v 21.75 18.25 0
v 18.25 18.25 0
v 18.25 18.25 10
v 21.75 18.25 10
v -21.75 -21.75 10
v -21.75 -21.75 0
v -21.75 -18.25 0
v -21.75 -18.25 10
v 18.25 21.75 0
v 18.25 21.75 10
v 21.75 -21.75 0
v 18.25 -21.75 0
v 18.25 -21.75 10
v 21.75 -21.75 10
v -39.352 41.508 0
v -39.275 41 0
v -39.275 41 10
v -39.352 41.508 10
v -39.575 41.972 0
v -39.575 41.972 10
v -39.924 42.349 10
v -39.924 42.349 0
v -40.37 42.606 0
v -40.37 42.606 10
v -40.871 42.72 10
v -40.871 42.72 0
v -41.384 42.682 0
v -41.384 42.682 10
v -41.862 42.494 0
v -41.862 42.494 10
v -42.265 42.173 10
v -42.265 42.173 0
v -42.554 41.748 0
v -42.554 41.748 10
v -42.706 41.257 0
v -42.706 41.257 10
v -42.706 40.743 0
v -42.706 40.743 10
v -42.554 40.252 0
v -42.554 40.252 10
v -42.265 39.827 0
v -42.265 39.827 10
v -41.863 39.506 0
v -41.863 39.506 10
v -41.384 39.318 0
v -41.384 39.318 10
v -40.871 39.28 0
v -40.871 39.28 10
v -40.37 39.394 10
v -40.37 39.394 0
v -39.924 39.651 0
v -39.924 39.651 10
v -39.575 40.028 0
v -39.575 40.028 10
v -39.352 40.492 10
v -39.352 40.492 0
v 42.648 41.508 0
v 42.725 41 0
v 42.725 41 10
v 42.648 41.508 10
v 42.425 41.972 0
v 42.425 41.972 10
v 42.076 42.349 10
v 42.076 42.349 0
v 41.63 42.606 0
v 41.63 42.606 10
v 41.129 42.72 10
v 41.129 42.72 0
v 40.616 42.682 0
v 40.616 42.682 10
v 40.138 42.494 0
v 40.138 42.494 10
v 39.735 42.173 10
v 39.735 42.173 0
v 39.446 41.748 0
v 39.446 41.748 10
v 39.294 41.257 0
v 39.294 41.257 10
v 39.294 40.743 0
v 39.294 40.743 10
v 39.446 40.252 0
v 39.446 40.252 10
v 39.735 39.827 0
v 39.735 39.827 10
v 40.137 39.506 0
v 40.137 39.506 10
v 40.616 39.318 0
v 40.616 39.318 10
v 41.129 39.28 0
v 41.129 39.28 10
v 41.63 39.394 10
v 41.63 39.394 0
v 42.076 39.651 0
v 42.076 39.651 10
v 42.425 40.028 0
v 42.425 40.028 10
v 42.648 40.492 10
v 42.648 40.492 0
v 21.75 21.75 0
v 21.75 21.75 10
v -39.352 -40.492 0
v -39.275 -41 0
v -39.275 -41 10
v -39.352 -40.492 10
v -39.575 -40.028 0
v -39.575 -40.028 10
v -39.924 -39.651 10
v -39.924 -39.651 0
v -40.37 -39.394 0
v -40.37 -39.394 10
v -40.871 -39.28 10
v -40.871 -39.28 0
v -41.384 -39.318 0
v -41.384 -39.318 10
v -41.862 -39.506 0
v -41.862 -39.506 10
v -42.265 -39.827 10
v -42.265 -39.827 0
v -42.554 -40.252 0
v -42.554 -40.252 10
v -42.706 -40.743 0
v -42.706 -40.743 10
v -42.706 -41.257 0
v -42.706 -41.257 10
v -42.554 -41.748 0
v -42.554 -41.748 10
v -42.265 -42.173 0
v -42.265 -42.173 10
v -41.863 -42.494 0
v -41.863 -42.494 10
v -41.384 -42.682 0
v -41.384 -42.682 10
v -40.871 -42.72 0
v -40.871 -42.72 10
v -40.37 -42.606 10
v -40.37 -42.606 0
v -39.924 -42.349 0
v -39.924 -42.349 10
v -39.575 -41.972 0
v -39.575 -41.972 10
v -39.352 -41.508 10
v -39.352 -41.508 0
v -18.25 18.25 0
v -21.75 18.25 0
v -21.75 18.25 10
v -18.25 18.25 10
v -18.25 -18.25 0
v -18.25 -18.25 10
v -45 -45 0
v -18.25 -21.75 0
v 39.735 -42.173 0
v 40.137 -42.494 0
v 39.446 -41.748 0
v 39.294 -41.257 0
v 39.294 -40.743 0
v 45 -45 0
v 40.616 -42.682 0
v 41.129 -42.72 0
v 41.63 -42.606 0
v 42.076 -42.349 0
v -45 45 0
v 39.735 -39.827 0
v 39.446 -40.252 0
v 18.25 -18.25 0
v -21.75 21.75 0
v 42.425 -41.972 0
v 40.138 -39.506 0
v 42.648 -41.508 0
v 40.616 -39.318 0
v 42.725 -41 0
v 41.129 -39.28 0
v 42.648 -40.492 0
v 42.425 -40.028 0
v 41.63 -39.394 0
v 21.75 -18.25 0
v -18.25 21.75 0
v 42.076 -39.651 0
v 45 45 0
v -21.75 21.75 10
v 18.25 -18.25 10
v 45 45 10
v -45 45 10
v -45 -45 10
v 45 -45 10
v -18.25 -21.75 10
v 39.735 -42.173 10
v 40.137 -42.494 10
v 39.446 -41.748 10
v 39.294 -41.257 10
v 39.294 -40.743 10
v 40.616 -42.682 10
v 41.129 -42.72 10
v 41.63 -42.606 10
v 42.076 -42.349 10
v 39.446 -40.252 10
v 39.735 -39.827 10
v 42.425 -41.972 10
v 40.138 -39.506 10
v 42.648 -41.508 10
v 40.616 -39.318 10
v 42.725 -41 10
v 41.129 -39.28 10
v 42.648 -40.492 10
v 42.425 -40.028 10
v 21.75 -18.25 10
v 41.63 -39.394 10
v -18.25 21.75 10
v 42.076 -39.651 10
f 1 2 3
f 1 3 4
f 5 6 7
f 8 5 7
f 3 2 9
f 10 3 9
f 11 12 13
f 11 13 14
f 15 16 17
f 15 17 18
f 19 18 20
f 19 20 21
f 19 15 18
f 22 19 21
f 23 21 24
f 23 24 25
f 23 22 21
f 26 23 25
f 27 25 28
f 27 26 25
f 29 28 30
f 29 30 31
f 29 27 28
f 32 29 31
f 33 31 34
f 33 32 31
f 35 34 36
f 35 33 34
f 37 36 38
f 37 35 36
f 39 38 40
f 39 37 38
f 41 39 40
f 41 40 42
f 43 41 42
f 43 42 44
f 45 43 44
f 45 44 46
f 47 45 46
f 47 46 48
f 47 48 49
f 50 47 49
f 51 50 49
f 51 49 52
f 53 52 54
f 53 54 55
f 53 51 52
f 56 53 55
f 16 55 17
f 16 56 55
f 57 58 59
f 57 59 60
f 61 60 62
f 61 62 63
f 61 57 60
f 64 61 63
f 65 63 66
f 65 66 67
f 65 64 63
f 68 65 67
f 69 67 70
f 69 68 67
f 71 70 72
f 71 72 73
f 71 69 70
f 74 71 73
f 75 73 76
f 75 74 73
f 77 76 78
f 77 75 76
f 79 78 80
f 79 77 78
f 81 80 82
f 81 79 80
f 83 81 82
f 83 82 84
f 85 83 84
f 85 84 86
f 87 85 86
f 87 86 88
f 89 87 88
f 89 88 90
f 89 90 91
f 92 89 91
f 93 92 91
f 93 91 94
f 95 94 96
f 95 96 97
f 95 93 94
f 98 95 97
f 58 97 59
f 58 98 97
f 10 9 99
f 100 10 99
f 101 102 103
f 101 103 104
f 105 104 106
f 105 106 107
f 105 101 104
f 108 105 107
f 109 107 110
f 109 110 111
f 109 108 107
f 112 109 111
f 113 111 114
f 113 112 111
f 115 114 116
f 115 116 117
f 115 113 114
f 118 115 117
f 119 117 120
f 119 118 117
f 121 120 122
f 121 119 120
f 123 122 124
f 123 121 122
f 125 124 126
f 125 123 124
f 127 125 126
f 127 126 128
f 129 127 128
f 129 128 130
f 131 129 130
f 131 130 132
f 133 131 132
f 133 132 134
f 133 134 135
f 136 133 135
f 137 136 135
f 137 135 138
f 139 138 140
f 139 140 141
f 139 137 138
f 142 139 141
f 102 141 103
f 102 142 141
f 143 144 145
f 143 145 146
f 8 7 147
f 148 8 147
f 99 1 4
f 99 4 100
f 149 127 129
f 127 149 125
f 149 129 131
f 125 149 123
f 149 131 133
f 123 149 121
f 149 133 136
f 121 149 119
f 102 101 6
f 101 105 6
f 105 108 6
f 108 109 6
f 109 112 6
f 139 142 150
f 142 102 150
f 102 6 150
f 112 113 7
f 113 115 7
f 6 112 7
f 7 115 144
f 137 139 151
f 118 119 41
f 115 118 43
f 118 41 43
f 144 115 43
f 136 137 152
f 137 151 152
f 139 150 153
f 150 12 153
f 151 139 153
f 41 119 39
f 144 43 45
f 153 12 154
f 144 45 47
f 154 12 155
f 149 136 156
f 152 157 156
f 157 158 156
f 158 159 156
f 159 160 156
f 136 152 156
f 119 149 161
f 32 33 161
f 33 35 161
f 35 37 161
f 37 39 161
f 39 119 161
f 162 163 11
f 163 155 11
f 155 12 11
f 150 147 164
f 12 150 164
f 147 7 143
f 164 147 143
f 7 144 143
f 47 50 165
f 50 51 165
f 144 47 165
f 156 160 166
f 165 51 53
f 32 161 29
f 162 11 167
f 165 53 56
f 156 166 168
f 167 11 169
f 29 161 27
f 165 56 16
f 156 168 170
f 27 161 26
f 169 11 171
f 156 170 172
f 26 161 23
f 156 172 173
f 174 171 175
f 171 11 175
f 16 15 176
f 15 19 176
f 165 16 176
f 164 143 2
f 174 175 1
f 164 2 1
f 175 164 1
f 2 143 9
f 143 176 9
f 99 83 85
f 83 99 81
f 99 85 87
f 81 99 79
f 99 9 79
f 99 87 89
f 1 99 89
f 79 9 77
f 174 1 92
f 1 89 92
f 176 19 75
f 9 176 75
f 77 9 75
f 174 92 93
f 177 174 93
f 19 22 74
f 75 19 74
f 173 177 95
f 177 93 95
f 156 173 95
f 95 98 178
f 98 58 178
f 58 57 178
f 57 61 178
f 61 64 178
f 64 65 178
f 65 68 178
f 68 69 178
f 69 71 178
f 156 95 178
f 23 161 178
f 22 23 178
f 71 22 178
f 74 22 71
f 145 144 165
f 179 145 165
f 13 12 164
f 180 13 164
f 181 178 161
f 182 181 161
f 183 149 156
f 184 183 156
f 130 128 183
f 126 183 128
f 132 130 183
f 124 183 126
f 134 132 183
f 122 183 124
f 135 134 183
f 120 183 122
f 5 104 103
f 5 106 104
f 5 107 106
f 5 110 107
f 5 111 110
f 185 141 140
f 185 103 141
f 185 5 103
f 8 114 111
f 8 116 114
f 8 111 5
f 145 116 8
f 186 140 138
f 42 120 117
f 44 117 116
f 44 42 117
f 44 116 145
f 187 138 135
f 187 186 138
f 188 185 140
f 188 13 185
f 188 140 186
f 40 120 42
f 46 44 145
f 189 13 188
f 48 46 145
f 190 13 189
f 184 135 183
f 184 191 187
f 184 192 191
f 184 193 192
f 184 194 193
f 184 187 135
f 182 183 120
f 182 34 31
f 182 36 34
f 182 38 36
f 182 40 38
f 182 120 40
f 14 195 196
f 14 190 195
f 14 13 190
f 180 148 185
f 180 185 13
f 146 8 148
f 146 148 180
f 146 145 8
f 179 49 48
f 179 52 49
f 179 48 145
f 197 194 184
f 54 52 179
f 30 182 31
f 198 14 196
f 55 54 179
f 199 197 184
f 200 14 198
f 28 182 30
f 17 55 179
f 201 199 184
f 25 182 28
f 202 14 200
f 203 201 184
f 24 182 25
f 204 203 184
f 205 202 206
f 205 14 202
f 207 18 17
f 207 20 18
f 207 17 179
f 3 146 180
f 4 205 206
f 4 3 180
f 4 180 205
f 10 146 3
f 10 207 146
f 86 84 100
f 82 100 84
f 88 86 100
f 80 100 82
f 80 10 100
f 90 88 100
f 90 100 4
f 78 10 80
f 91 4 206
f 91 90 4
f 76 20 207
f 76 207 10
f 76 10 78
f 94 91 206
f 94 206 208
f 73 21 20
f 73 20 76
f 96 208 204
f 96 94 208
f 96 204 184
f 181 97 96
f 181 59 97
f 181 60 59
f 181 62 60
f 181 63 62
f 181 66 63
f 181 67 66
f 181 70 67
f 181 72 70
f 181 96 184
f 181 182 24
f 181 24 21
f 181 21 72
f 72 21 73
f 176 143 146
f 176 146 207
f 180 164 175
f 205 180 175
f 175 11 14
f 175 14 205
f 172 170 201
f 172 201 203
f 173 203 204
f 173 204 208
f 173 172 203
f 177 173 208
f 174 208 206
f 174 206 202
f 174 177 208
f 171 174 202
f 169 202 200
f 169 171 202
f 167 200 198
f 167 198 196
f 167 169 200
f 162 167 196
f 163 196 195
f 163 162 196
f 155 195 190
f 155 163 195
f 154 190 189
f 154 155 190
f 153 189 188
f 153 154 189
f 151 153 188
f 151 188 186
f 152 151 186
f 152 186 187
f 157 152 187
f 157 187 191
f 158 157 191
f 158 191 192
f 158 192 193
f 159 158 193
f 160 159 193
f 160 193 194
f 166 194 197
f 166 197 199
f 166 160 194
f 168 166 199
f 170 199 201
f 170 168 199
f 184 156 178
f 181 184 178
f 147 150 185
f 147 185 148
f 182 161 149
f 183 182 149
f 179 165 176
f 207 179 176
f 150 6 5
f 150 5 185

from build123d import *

# Parameters (mm, degrees)
F0_R     = 1.725
F0_W     = 3.5
F0_H     = 3.5
F1_DEPTH = 10


with BuildPart() as f1:
    # F0 (on Top) → F1 (new body)
    with BuildSketch(Plane.XY):
        Polygon((45, -45), (45, 0), (45, 45), (0, 45), (-45, 45), (-45, 0), (-45, -45), (0, -45), align=None)
        with Locations((-41, -41)):
            Circle(F0_R, mode=Mode.SUBTRACT)
        with Locations((-20, -20)):
            Rectangle(F0_W, F0_H, mode=Mode.SUBTRACT)
        with Locations((41, -41)):
            Circle(F0_R, mode=Mode.SUBTRACT)
        with Locations((20, -20)):
            Rectangle(F0_W, F0_H, mode=Mode.SUBTRACT)
        with Locations((-20, 20)):
            Rectangle(F0_W, F0_H, mode=Mode.SUBTRACT)
        with Locations((-41, 41)):
            Circle(F0_R, mode=Mode.SUBTRACT)
        with Locations((20, 20)):
            Rectangle(F0_W, F0_H, mode=Mode.SUBTRACT)
        with Locations((41, 41)):
            Circle(F0_R, mode=Mode.SUBTRACT)
    extrude(amount=F1_DEPTH)


solid = f1.part
